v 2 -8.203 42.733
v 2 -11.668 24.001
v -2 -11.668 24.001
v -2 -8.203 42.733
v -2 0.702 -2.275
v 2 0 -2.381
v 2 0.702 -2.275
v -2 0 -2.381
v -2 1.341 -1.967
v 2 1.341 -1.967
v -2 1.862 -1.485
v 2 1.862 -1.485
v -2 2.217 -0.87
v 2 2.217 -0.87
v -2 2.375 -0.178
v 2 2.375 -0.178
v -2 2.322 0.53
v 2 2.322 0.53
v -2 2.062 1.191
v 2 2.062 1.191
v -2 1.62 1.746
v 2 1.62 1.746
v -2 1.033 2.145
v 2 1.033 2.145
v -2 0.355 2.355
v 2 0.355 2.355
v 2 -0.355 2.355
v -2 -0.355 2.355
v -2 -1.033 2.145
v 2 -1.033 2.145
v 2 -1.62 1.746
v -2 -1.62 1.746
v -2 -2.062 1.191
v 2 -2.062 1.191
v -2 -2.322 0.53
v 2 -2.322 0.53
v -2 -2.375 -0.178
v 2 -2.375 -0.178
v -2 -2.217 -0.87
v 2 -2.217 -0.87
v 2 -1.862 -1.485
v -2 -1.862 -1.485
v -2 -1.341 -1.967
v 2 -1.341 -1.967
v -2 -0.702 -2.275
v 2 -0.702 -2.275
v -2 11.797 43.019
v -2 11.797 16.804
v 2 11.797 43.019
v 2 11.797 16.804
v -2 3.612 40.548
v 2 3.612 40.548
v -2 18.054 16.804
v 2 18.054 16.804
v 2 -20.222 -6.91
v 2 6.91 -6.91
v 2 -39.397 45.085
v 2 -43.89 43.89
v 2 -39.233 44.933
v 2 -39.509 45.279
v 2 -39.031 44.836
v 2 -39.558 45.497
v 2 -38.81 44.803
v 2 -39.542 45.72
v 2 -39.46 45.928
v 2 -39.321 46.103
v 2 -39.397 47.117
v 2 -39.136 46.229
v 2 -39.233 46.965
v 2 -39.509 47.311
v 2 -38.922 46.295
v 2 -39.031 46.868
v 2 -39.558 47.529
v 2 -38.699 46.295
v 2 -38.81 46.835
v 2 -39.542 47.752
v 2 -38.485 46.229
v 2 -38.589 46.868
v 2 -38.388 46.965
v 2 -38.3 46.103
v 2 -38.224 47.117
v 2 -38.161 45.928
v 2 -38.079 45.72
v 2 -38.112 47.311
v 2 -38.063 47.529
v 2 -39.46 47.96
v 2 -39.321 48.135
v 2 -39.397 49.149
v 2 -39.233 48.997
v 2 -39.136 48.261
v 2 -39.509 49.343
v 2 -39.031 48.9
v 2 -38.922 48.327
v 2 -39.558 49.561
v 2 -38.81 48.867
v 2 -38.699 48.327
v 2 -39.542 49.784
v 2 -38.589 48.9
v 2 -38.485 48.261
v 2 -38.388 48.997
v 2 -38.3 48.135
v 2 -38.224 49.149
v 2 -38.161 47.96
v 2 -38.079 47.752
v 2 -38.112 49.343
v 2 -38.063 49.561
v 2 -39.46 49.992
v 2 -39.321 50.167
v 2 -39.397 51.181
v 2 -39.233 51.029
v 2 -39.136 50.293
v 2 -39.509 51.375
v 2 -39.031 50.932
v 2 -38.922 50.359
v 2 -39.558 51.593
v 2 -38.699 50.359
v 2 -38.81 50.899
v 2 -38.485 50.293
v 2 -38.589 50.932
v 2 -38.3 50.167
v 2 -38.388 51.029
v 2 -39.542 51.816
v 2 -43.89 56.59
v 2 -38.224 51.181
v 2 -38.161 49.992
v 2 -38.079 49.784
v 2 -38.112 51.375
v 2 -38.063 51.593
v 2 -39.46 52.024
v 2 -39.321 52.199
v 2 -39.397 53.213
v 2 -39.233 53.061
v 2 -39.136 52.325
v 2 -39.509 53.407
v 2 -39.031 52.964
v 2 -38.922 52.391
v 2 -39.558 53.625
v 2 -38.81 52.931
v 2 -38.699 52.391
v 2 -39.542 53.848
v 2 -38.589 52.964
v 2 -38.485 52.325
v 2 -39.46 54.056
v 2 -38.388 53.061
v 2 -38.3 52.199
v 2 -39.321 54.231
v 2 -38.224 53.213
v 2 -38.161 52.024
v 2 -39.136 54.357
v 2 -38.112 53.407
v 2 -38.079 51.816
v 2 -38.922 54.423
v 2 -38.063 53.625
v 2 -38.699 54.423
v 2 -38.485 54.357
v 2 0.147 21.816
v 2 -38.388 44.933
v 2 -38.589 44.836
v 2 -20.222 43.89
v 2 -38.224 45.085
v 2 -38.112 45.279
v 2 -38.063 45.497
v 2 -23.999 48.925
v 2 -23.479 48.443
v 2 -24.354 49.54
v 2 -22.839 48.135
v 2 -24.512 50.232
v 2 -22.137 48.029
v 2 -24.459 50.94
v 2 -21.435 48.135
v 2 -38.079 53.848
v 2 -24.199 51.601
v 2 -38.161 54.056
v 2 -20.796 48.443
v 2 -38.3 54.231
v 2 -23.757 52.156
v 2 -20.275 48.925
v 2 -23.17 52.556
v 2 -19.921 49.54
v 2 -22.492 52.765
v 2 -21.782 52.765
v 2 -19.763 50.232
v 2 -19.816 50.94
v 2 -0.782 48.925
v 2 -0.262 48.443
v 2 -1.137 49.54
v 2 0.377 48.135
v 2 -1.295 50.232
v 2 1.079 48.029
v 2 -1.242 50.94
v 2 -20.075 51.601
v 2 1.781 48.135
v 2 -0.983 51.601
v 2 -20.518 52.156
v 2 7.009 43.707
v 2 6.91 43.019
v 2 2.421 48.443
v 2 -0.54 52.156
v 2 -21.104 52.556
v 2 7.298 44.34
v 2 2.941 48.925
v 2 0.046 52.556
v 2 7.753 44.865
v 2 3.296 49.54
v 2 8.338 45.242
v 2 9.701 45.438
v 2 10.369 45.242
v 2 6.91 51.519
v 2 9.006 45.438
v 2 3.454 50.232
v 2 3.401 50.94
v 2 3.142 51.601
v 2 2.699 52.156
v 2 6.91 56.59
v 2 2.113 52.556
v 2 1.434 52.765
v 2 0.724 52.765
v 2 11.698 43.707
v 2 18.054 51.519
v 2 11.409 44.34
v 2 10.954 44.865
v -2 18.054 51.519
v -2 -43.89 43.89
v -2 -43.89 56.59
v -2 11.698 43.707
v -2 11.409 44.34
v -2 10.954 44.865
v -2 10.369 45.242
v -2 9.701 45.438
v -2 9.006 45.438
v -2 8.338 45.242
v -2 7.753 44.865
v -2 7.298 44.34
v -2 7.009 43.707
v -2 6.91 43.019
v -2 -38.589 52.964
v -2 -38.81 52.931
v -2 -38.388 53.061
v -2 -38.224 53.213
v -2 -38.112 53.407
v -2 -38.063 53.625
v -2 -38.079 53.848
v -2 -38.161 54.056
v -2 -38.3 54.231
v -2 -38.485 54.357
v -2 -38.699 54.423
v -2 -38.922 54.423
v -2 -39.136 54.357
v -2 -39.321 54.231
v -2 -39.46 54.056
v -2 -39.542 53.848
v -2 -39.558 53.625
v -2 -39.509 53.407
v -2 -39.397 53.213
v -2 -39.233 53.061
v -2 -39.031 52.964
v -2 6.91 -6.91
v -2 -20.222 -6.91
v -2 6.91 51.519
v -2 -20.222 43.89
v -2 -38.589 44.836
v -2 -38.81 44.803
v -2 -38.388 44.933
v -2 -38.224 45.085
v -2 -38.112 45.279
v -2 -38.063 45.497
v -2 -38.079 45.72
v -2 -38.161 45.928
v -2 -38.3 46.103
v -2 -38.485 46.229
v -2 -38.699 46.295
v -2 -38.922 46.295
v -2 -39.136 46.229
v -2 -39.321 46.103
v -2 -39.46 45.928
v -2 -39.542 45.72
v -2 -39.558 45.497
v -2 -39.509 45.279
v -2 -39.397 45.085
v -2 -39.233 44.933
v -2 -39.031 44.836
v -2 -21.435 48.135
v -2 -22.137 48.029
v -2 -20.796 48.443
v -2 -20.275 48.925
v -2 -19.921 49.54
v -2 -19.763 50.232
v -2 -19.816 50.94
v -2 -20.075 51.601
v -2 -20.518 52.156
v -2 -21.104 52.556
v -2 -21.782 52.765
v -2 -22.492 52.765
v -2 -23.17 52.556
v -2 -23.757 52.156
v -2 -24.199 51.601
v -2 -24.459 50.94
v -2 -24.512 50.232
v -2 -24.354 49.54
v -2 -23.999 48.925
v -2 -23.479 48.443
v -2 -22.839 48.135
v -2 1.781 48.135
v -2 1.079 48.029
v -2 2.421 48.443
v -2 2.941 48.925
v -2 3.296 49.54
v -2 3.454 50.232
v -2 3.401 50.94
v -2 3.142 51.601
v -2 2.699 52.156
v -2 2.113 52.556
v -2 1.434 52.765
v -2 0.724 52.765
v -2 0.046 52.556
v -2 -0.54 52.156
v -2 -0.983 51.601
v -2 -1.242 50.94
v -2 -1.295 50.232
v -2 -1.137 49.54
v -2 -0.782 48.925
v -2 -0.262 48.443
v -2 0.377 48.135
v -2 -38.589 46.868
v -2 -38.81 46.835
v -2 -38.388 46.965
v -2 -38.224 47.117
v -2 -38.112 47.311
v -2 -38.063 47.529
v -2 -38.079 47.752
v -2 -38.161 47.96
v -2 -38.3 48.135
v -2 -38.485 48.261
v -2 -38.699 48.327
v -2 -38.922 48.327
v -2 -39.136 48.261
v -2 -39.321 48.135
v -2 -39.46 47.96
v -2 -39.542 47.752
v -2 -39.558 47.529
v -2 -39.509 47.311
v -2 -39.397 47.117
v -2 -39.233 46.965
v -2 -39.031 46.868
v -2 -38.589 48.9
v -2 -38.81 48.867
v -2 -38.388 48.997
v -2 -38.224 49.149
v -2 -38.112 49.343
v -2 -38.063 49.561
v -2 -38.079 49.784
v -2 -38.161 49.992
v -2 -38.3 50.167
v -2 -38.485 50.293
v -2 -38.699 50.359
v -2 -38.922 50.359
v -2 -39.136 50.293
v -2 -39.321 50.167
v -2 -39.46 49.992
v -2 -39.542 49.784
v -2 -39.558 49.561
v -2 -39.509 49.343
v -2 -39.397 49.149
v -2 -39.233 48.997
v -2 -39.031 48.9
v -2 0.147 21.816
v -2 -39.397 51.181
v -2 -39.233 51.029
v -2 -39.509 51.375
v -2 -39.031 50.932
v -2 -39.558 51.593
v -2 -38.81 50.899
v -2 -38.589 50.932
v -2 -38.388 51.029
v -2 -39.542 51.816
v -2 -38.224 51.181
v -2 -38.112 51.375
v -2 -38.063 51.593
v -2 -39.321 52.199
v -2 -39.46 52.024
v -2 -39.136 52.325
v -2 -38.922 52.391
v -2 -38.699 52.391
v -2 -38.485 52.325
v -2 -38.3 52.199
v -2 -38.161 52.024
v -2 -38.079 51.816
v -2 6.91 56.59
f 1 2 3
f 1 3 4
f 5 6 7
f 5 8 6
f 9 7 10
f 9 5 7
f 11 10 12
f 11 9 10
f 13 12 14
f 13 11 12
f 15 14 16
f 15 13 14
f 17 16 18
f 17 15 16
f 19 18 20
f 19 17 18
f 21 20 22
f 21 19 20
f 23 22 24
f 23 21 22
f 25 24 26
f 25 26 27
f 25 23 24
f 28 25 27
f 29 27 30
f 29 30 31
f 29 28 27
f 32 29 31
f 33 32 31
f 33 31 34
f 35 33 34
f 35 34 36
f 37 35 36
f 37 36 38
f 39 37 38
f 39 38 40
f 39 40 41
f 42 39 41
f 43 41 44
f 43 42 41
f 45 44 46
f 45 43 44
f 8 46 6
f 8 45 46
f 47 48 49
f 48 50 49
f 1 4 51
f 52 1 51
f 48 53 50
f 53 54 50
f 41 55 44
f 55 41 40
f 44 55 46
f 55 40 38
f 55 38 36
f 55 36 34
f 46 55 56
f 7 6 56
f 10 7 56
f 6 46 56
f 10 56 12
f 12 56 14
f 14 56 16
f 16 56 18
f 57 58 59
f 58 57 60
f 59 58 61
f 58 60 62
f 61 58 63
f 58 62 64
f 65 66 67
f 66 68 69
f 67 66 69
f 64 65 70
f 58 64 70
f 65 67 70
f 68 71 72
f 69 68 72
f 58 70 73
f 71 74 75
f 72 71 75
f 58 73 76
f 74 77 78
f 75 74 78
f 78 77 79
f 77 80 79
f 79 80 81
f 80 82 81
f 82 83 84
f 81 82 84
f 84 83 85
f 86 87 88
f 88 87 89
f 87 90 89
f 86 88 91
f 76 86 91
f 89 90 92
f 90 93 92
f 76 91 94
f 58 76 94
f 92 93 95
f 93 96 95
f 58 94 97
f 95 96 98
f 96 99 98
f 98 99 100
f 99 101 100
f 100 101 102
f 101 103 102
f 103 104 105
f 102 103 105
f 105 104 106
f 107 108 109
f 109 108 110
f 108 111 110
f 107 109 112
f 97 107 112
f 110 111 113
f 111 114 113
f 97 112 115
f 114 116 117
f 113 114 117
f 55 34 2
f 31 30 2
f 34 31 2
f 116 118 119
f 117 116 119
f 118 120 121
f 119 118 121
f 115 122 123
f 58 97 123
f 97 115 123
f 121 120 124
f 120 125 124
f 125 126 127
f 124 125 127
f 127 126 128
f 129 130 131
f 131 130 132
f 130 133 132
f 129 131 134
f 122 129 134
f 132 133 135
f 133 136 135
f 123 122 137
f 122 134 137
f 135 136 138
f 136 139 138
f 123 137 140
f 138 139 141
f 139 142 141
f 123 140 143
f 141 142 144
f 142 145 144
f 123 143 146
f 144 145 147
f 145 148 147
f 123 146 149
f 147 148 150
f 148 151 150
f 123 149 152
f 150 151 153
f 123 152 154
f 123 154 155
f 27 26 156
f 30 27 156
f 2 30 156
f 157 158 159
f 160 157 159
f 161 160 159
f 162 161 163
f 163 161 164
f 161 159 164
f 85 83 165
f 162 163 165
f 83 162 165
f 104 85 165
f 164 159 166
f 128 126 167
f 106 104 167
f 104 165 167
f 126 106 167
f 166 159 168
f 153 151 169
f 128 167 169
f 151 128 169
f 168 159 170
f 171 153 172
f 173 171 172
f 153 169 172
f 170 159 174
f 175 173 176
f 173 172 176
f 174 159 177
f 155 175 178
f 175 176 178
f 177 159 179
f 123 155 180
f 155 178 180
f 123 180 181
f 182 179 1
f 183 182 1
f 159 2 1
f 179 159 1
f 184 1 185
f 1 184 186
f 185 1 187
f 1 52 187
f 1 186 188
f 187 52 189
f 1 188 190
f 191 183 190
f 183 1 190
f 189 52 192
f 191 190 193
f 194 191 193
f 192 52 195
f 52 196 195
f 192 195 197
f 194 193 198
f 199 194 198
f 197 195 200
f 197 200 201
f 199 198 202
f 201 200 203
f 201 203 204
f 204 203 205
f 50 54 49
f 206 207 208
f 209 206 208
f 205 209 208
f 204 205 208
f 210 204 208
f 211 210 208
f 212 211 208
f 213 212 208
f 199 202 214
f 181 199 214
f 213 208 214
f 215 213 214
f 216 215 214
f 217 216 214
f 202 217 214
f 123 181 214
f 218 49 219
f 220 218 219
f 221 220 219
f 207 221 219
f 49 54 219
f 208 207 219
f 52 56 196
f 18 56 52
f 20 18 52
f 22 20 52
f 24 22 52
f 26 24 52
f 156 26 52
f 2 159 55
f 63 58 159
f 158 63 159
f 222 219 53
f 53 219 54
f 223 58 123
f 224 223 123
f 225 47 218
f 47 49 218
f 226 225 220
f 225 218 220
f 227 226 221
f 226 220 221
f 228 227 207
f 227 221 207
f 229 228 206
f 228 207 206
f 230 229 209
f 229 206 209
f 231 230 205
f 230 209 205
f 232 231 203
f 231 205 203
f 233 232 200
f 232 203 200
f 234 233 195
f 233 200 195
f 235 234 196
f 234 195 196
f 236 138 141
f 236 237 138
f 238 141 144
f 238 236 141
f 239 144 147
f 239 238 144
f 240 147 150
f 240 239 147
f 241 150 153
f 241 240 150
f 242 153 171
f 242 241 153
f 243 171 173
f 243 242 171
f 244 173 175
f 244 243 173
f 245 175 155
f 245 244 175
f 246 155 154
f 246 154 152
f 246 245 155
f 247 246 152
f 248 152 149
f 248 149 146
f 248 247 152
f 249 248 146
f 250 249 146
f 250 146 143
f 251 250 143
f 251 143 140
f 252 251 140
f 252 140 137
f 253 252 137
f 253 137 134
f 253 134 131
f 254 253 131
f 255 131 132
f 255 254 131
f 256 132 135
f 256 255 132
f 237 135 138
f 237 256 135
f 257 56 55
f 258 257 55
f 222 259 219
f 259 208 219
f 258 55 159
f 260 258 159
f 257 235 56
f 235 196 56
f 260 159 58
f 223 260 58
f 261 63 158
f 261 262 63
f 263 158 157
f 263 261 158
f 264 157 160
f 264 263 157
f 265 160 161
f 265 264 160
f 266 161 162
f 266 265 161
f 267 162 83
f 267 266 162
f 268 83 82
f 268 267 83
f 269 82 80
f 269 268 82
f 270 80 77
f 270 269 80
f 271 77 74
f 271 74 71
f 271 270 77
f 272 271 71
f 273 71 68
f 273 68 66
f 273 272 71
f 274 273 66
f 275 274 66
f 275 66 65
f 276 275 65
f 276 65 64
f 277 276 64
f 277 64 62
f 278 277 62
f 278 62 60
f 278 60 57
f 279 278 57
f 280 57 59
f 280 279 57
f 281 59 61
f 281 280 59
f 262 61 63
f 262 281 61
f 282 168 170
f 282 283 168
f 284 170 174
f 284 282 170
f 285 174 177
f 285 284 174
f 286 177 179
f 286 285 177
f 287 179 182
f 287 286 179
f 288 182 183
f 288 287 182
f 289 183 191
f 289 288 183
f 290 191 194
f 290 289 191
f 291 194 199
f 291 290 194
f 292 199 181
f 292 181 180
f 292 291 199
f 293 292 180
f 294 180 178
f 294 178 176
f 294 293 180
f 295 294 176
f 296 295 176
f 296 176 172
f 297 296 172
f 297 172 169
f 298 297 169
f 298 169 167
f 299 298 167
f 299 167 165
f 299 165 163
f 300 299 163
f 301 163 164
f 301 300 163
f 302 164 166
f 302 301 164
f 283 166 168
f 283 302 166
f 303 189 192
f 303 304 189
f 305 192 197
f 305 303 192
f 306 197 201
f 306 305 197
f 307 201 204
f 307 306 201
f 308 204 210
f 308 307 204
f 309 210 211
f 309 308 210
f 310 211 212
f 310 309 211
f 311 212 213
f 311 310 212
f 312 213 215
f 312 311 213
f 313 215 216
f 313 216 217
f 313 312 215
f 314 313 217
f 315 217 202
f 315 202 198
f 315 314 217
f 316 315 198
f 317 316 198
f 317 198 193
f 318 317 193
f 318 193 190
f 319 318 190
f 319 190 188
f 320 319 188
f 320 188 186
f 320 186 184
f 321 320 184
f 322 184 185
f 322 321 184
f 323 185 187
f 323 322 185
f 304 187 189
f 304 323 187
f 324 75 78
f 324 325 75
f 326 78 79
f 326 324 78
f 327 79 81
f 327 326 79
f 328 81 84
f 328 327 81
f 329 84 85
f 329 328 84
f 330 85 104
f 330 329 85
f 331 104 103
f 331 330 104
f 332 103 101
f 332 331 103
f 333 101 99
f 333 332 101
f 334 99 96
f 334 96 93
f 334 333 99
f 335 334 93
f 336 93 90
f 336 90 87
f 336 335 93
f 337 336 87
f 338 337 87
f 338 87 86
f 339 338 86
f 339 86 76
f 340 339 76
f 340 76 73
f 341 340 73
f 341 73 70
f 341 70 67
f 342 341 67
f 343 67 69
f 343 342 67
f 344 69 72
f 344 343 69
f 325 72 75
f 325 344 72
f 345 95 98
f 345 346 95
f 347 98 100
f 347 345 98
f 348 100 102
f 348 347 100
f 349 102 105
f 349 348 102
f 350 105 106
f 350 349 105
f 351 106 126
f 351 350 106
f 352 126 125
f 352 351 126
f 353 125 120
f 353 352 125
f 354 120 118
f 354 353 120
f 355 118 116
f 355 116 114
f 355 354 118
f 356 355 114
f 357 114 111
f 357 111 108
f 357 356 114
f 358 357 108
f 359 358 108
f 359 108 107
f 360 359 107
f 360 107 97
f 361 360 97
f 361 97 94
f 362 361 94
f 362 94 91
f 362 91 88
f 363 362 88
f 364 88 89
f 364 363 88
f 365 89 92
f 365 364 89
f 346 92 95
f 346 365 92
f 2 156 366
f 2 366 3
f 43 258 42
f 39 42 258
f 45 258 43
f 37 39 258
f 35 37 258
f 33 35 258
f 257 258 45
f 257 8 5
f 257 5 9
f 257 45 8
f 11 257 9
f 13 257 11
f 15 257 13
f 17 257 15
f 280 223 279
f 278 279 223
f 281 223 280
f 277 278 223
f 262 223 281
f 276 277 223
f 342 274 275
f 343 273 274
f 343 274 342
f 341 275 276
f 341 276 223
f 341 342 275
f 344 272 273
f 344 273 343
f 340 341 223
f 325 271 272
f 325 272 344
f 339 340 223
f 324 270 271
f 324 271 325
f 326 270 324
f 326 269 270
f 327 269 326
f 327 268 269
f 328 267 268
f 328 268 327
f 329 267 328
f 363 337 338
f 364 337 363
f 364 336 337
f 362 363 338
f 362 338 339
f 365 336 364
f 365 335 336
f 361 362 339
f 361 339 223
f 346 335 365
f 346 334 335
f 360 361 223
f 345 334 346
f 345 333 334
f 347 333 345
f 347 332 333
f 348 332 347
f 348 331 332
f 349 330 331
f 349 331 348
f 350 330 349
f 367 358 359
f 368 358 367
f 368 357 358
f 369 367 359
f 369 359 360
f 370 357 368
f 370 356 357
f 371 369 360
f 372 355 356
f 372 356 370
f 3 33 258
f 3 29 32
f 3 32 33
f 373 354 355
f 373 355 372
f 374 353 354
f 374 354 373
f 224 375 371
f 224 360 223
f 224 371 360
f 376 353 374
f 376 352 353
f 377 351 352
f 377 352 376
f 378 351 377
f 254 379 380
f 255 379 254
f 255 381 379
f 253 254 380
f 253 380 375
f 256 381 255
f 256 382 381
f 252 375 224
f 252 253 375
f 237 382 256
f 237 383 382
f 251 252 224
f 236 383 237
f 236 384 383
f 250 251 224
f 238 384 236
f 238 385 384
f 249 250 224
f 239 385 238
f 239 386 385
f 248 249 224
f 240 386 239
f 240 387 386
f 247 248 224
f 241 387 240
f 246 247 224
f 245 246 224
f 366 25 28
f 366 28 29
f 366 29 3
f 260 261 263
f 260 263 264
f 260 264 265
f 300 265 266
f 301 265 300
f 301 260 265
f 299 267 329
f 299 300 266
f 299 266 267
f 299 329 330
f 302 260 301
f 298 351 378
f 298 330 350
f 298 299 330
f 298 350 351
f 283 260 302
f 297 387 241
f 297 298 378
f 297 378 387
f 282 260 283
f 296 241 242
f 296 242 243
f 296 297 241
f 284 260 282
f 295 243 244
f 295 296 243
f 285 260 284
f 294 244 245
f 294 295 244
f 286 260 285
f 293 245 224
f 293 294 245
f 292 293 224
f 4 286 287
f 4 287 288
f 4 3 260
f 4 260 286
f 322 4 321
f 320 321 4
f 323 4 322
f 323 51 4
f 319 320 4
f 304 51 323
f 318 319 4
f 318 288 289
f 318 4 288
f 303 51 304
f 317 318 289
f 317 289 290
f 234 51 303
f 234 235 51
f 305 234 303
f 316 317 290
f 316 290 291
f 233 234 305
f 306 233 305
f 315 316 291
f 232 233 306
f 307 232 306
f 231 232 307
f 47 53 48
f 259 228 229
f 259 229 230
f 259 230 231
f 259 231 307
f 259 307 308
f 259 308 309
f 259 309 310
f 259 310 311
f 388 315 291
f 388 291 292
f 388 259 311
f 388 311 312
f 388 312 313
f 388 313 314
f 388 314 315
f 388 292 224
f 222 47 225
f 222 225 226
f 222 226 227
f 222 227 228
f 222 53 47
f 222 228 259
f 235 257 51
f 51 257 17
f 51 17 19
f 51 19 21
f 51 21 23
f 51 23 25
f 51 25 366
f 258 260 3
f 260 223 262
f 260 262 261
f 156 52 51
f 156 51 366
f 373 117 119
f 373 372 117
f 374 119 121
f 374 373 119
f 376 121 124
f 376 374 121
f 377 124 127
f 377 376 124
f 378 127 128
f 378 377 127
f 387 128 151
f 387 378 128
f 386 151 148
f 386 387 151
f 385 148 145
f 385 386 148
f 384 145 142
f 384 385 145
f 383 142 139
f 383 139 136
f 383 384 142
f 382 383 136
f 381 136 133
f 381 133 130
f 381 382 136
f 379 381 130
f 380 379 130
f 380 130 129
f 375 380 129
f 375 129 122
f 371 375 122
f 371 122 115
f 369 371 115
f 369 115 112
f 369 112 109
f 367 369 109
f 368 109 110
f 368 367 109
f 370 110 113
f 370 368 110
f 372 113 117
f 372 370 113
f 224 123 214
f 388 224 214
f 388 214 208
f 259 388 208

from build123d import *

# Parameters (mm, degrees)
SKETCH1_R           = 2.38125
SKETCH1_R_2         = 0.75
BOSS_EXTRUDE1_DEPTH = 2


with BuildPart() as part:
    # Sketch1 → Boss-Extrude1 (new, symmetric)
    with BuildSketch(Plane(origin=(0, 0, 0), x_dir=(0, 0, -1), z_dir=(1, 0, 0))):
        with BuildLine():
            Line((-56.590412722, 6.909587278), (-51.518608779, 6.909587278))
            Line((-51.518608779, 6.909587278), (-51.518608779, 18.053715602))
            Line((-51.518608779, 18.053715602), (-16.803992093, 18.053715602))
            Line((-16.803992093, 18.053715602), (-16.803992093, 11.79733741))
            Line((-16.803992093, 11.79733741), (-43.018535026, 11.79733741))
            ThreePointArc((-43.018535026, 11.79733741), (-45.462410091, 9.353462344), (-43.018535026, 6.909587278))
            Line((-43.018535026, 6.909587278), (6.909587278, 6.909587278))
            Line((6.909587278, 6.909587278), (6.909587278, -20.222057583))
            Line((6.909587278, -20.222057583), (-43.890412722, -20.222057583))
            Line((-43.890412722, -20.222057583), (-43.890412722, -43.890412722))
            Line((-43.890412722, -43.890412722), (-56.590412722, -43.890412722))
            Line((-56.590412722, -43.890412722), (-56.590412722, 6.909587278))
        make_face()
        Circle(SKETCH1_R, mode=Mode.SUBTRACT)
        with Locations((-45.552958224, -38.810412722)):
            Circle(SKETCH1_R_2, mode=Mode.SUBTRACT)
        with Locations((-47.584958224, -38.810412722)):
            Circle(SKETCH1_R_2, mode=Mode.SUBTRACT)
        with Locations((-49.616958224, -38.810412722)):
            Circle(SKETCH1_R_2, mode=Mode.SUBTRACT)
        with Locations((-51.648958224, -38.810412722)):
            Circle(SKETCH1_R_2, mode=Mode.SUBTRACT)
        with Locations((-50.410128911, -22.137211246)):
            Circle(SKETCH1_R, mode=Mode.SUBTRACT)
        with Locations((-50.410128911, 1.079375692)):
            Circle(SKETCH1_R, mode=Mode.SUBTRACT)
        with Locations((-53.680958224, -38.810412722)):
            Circle(SKETCH1_R_2, mode=Mode.SUBTRACT)
        Polygon((-40.547855017, 3.612408172), (-21.81561352, 0.147494252), (-24.001169646, -11.668200482), (-42.733411143, -8.203286562), align=None, mode=Mode.SUBTRACT)
    extrude(amount=BOSS_EXTRUDE1_DEPTH, both=True)


solid = part.part
